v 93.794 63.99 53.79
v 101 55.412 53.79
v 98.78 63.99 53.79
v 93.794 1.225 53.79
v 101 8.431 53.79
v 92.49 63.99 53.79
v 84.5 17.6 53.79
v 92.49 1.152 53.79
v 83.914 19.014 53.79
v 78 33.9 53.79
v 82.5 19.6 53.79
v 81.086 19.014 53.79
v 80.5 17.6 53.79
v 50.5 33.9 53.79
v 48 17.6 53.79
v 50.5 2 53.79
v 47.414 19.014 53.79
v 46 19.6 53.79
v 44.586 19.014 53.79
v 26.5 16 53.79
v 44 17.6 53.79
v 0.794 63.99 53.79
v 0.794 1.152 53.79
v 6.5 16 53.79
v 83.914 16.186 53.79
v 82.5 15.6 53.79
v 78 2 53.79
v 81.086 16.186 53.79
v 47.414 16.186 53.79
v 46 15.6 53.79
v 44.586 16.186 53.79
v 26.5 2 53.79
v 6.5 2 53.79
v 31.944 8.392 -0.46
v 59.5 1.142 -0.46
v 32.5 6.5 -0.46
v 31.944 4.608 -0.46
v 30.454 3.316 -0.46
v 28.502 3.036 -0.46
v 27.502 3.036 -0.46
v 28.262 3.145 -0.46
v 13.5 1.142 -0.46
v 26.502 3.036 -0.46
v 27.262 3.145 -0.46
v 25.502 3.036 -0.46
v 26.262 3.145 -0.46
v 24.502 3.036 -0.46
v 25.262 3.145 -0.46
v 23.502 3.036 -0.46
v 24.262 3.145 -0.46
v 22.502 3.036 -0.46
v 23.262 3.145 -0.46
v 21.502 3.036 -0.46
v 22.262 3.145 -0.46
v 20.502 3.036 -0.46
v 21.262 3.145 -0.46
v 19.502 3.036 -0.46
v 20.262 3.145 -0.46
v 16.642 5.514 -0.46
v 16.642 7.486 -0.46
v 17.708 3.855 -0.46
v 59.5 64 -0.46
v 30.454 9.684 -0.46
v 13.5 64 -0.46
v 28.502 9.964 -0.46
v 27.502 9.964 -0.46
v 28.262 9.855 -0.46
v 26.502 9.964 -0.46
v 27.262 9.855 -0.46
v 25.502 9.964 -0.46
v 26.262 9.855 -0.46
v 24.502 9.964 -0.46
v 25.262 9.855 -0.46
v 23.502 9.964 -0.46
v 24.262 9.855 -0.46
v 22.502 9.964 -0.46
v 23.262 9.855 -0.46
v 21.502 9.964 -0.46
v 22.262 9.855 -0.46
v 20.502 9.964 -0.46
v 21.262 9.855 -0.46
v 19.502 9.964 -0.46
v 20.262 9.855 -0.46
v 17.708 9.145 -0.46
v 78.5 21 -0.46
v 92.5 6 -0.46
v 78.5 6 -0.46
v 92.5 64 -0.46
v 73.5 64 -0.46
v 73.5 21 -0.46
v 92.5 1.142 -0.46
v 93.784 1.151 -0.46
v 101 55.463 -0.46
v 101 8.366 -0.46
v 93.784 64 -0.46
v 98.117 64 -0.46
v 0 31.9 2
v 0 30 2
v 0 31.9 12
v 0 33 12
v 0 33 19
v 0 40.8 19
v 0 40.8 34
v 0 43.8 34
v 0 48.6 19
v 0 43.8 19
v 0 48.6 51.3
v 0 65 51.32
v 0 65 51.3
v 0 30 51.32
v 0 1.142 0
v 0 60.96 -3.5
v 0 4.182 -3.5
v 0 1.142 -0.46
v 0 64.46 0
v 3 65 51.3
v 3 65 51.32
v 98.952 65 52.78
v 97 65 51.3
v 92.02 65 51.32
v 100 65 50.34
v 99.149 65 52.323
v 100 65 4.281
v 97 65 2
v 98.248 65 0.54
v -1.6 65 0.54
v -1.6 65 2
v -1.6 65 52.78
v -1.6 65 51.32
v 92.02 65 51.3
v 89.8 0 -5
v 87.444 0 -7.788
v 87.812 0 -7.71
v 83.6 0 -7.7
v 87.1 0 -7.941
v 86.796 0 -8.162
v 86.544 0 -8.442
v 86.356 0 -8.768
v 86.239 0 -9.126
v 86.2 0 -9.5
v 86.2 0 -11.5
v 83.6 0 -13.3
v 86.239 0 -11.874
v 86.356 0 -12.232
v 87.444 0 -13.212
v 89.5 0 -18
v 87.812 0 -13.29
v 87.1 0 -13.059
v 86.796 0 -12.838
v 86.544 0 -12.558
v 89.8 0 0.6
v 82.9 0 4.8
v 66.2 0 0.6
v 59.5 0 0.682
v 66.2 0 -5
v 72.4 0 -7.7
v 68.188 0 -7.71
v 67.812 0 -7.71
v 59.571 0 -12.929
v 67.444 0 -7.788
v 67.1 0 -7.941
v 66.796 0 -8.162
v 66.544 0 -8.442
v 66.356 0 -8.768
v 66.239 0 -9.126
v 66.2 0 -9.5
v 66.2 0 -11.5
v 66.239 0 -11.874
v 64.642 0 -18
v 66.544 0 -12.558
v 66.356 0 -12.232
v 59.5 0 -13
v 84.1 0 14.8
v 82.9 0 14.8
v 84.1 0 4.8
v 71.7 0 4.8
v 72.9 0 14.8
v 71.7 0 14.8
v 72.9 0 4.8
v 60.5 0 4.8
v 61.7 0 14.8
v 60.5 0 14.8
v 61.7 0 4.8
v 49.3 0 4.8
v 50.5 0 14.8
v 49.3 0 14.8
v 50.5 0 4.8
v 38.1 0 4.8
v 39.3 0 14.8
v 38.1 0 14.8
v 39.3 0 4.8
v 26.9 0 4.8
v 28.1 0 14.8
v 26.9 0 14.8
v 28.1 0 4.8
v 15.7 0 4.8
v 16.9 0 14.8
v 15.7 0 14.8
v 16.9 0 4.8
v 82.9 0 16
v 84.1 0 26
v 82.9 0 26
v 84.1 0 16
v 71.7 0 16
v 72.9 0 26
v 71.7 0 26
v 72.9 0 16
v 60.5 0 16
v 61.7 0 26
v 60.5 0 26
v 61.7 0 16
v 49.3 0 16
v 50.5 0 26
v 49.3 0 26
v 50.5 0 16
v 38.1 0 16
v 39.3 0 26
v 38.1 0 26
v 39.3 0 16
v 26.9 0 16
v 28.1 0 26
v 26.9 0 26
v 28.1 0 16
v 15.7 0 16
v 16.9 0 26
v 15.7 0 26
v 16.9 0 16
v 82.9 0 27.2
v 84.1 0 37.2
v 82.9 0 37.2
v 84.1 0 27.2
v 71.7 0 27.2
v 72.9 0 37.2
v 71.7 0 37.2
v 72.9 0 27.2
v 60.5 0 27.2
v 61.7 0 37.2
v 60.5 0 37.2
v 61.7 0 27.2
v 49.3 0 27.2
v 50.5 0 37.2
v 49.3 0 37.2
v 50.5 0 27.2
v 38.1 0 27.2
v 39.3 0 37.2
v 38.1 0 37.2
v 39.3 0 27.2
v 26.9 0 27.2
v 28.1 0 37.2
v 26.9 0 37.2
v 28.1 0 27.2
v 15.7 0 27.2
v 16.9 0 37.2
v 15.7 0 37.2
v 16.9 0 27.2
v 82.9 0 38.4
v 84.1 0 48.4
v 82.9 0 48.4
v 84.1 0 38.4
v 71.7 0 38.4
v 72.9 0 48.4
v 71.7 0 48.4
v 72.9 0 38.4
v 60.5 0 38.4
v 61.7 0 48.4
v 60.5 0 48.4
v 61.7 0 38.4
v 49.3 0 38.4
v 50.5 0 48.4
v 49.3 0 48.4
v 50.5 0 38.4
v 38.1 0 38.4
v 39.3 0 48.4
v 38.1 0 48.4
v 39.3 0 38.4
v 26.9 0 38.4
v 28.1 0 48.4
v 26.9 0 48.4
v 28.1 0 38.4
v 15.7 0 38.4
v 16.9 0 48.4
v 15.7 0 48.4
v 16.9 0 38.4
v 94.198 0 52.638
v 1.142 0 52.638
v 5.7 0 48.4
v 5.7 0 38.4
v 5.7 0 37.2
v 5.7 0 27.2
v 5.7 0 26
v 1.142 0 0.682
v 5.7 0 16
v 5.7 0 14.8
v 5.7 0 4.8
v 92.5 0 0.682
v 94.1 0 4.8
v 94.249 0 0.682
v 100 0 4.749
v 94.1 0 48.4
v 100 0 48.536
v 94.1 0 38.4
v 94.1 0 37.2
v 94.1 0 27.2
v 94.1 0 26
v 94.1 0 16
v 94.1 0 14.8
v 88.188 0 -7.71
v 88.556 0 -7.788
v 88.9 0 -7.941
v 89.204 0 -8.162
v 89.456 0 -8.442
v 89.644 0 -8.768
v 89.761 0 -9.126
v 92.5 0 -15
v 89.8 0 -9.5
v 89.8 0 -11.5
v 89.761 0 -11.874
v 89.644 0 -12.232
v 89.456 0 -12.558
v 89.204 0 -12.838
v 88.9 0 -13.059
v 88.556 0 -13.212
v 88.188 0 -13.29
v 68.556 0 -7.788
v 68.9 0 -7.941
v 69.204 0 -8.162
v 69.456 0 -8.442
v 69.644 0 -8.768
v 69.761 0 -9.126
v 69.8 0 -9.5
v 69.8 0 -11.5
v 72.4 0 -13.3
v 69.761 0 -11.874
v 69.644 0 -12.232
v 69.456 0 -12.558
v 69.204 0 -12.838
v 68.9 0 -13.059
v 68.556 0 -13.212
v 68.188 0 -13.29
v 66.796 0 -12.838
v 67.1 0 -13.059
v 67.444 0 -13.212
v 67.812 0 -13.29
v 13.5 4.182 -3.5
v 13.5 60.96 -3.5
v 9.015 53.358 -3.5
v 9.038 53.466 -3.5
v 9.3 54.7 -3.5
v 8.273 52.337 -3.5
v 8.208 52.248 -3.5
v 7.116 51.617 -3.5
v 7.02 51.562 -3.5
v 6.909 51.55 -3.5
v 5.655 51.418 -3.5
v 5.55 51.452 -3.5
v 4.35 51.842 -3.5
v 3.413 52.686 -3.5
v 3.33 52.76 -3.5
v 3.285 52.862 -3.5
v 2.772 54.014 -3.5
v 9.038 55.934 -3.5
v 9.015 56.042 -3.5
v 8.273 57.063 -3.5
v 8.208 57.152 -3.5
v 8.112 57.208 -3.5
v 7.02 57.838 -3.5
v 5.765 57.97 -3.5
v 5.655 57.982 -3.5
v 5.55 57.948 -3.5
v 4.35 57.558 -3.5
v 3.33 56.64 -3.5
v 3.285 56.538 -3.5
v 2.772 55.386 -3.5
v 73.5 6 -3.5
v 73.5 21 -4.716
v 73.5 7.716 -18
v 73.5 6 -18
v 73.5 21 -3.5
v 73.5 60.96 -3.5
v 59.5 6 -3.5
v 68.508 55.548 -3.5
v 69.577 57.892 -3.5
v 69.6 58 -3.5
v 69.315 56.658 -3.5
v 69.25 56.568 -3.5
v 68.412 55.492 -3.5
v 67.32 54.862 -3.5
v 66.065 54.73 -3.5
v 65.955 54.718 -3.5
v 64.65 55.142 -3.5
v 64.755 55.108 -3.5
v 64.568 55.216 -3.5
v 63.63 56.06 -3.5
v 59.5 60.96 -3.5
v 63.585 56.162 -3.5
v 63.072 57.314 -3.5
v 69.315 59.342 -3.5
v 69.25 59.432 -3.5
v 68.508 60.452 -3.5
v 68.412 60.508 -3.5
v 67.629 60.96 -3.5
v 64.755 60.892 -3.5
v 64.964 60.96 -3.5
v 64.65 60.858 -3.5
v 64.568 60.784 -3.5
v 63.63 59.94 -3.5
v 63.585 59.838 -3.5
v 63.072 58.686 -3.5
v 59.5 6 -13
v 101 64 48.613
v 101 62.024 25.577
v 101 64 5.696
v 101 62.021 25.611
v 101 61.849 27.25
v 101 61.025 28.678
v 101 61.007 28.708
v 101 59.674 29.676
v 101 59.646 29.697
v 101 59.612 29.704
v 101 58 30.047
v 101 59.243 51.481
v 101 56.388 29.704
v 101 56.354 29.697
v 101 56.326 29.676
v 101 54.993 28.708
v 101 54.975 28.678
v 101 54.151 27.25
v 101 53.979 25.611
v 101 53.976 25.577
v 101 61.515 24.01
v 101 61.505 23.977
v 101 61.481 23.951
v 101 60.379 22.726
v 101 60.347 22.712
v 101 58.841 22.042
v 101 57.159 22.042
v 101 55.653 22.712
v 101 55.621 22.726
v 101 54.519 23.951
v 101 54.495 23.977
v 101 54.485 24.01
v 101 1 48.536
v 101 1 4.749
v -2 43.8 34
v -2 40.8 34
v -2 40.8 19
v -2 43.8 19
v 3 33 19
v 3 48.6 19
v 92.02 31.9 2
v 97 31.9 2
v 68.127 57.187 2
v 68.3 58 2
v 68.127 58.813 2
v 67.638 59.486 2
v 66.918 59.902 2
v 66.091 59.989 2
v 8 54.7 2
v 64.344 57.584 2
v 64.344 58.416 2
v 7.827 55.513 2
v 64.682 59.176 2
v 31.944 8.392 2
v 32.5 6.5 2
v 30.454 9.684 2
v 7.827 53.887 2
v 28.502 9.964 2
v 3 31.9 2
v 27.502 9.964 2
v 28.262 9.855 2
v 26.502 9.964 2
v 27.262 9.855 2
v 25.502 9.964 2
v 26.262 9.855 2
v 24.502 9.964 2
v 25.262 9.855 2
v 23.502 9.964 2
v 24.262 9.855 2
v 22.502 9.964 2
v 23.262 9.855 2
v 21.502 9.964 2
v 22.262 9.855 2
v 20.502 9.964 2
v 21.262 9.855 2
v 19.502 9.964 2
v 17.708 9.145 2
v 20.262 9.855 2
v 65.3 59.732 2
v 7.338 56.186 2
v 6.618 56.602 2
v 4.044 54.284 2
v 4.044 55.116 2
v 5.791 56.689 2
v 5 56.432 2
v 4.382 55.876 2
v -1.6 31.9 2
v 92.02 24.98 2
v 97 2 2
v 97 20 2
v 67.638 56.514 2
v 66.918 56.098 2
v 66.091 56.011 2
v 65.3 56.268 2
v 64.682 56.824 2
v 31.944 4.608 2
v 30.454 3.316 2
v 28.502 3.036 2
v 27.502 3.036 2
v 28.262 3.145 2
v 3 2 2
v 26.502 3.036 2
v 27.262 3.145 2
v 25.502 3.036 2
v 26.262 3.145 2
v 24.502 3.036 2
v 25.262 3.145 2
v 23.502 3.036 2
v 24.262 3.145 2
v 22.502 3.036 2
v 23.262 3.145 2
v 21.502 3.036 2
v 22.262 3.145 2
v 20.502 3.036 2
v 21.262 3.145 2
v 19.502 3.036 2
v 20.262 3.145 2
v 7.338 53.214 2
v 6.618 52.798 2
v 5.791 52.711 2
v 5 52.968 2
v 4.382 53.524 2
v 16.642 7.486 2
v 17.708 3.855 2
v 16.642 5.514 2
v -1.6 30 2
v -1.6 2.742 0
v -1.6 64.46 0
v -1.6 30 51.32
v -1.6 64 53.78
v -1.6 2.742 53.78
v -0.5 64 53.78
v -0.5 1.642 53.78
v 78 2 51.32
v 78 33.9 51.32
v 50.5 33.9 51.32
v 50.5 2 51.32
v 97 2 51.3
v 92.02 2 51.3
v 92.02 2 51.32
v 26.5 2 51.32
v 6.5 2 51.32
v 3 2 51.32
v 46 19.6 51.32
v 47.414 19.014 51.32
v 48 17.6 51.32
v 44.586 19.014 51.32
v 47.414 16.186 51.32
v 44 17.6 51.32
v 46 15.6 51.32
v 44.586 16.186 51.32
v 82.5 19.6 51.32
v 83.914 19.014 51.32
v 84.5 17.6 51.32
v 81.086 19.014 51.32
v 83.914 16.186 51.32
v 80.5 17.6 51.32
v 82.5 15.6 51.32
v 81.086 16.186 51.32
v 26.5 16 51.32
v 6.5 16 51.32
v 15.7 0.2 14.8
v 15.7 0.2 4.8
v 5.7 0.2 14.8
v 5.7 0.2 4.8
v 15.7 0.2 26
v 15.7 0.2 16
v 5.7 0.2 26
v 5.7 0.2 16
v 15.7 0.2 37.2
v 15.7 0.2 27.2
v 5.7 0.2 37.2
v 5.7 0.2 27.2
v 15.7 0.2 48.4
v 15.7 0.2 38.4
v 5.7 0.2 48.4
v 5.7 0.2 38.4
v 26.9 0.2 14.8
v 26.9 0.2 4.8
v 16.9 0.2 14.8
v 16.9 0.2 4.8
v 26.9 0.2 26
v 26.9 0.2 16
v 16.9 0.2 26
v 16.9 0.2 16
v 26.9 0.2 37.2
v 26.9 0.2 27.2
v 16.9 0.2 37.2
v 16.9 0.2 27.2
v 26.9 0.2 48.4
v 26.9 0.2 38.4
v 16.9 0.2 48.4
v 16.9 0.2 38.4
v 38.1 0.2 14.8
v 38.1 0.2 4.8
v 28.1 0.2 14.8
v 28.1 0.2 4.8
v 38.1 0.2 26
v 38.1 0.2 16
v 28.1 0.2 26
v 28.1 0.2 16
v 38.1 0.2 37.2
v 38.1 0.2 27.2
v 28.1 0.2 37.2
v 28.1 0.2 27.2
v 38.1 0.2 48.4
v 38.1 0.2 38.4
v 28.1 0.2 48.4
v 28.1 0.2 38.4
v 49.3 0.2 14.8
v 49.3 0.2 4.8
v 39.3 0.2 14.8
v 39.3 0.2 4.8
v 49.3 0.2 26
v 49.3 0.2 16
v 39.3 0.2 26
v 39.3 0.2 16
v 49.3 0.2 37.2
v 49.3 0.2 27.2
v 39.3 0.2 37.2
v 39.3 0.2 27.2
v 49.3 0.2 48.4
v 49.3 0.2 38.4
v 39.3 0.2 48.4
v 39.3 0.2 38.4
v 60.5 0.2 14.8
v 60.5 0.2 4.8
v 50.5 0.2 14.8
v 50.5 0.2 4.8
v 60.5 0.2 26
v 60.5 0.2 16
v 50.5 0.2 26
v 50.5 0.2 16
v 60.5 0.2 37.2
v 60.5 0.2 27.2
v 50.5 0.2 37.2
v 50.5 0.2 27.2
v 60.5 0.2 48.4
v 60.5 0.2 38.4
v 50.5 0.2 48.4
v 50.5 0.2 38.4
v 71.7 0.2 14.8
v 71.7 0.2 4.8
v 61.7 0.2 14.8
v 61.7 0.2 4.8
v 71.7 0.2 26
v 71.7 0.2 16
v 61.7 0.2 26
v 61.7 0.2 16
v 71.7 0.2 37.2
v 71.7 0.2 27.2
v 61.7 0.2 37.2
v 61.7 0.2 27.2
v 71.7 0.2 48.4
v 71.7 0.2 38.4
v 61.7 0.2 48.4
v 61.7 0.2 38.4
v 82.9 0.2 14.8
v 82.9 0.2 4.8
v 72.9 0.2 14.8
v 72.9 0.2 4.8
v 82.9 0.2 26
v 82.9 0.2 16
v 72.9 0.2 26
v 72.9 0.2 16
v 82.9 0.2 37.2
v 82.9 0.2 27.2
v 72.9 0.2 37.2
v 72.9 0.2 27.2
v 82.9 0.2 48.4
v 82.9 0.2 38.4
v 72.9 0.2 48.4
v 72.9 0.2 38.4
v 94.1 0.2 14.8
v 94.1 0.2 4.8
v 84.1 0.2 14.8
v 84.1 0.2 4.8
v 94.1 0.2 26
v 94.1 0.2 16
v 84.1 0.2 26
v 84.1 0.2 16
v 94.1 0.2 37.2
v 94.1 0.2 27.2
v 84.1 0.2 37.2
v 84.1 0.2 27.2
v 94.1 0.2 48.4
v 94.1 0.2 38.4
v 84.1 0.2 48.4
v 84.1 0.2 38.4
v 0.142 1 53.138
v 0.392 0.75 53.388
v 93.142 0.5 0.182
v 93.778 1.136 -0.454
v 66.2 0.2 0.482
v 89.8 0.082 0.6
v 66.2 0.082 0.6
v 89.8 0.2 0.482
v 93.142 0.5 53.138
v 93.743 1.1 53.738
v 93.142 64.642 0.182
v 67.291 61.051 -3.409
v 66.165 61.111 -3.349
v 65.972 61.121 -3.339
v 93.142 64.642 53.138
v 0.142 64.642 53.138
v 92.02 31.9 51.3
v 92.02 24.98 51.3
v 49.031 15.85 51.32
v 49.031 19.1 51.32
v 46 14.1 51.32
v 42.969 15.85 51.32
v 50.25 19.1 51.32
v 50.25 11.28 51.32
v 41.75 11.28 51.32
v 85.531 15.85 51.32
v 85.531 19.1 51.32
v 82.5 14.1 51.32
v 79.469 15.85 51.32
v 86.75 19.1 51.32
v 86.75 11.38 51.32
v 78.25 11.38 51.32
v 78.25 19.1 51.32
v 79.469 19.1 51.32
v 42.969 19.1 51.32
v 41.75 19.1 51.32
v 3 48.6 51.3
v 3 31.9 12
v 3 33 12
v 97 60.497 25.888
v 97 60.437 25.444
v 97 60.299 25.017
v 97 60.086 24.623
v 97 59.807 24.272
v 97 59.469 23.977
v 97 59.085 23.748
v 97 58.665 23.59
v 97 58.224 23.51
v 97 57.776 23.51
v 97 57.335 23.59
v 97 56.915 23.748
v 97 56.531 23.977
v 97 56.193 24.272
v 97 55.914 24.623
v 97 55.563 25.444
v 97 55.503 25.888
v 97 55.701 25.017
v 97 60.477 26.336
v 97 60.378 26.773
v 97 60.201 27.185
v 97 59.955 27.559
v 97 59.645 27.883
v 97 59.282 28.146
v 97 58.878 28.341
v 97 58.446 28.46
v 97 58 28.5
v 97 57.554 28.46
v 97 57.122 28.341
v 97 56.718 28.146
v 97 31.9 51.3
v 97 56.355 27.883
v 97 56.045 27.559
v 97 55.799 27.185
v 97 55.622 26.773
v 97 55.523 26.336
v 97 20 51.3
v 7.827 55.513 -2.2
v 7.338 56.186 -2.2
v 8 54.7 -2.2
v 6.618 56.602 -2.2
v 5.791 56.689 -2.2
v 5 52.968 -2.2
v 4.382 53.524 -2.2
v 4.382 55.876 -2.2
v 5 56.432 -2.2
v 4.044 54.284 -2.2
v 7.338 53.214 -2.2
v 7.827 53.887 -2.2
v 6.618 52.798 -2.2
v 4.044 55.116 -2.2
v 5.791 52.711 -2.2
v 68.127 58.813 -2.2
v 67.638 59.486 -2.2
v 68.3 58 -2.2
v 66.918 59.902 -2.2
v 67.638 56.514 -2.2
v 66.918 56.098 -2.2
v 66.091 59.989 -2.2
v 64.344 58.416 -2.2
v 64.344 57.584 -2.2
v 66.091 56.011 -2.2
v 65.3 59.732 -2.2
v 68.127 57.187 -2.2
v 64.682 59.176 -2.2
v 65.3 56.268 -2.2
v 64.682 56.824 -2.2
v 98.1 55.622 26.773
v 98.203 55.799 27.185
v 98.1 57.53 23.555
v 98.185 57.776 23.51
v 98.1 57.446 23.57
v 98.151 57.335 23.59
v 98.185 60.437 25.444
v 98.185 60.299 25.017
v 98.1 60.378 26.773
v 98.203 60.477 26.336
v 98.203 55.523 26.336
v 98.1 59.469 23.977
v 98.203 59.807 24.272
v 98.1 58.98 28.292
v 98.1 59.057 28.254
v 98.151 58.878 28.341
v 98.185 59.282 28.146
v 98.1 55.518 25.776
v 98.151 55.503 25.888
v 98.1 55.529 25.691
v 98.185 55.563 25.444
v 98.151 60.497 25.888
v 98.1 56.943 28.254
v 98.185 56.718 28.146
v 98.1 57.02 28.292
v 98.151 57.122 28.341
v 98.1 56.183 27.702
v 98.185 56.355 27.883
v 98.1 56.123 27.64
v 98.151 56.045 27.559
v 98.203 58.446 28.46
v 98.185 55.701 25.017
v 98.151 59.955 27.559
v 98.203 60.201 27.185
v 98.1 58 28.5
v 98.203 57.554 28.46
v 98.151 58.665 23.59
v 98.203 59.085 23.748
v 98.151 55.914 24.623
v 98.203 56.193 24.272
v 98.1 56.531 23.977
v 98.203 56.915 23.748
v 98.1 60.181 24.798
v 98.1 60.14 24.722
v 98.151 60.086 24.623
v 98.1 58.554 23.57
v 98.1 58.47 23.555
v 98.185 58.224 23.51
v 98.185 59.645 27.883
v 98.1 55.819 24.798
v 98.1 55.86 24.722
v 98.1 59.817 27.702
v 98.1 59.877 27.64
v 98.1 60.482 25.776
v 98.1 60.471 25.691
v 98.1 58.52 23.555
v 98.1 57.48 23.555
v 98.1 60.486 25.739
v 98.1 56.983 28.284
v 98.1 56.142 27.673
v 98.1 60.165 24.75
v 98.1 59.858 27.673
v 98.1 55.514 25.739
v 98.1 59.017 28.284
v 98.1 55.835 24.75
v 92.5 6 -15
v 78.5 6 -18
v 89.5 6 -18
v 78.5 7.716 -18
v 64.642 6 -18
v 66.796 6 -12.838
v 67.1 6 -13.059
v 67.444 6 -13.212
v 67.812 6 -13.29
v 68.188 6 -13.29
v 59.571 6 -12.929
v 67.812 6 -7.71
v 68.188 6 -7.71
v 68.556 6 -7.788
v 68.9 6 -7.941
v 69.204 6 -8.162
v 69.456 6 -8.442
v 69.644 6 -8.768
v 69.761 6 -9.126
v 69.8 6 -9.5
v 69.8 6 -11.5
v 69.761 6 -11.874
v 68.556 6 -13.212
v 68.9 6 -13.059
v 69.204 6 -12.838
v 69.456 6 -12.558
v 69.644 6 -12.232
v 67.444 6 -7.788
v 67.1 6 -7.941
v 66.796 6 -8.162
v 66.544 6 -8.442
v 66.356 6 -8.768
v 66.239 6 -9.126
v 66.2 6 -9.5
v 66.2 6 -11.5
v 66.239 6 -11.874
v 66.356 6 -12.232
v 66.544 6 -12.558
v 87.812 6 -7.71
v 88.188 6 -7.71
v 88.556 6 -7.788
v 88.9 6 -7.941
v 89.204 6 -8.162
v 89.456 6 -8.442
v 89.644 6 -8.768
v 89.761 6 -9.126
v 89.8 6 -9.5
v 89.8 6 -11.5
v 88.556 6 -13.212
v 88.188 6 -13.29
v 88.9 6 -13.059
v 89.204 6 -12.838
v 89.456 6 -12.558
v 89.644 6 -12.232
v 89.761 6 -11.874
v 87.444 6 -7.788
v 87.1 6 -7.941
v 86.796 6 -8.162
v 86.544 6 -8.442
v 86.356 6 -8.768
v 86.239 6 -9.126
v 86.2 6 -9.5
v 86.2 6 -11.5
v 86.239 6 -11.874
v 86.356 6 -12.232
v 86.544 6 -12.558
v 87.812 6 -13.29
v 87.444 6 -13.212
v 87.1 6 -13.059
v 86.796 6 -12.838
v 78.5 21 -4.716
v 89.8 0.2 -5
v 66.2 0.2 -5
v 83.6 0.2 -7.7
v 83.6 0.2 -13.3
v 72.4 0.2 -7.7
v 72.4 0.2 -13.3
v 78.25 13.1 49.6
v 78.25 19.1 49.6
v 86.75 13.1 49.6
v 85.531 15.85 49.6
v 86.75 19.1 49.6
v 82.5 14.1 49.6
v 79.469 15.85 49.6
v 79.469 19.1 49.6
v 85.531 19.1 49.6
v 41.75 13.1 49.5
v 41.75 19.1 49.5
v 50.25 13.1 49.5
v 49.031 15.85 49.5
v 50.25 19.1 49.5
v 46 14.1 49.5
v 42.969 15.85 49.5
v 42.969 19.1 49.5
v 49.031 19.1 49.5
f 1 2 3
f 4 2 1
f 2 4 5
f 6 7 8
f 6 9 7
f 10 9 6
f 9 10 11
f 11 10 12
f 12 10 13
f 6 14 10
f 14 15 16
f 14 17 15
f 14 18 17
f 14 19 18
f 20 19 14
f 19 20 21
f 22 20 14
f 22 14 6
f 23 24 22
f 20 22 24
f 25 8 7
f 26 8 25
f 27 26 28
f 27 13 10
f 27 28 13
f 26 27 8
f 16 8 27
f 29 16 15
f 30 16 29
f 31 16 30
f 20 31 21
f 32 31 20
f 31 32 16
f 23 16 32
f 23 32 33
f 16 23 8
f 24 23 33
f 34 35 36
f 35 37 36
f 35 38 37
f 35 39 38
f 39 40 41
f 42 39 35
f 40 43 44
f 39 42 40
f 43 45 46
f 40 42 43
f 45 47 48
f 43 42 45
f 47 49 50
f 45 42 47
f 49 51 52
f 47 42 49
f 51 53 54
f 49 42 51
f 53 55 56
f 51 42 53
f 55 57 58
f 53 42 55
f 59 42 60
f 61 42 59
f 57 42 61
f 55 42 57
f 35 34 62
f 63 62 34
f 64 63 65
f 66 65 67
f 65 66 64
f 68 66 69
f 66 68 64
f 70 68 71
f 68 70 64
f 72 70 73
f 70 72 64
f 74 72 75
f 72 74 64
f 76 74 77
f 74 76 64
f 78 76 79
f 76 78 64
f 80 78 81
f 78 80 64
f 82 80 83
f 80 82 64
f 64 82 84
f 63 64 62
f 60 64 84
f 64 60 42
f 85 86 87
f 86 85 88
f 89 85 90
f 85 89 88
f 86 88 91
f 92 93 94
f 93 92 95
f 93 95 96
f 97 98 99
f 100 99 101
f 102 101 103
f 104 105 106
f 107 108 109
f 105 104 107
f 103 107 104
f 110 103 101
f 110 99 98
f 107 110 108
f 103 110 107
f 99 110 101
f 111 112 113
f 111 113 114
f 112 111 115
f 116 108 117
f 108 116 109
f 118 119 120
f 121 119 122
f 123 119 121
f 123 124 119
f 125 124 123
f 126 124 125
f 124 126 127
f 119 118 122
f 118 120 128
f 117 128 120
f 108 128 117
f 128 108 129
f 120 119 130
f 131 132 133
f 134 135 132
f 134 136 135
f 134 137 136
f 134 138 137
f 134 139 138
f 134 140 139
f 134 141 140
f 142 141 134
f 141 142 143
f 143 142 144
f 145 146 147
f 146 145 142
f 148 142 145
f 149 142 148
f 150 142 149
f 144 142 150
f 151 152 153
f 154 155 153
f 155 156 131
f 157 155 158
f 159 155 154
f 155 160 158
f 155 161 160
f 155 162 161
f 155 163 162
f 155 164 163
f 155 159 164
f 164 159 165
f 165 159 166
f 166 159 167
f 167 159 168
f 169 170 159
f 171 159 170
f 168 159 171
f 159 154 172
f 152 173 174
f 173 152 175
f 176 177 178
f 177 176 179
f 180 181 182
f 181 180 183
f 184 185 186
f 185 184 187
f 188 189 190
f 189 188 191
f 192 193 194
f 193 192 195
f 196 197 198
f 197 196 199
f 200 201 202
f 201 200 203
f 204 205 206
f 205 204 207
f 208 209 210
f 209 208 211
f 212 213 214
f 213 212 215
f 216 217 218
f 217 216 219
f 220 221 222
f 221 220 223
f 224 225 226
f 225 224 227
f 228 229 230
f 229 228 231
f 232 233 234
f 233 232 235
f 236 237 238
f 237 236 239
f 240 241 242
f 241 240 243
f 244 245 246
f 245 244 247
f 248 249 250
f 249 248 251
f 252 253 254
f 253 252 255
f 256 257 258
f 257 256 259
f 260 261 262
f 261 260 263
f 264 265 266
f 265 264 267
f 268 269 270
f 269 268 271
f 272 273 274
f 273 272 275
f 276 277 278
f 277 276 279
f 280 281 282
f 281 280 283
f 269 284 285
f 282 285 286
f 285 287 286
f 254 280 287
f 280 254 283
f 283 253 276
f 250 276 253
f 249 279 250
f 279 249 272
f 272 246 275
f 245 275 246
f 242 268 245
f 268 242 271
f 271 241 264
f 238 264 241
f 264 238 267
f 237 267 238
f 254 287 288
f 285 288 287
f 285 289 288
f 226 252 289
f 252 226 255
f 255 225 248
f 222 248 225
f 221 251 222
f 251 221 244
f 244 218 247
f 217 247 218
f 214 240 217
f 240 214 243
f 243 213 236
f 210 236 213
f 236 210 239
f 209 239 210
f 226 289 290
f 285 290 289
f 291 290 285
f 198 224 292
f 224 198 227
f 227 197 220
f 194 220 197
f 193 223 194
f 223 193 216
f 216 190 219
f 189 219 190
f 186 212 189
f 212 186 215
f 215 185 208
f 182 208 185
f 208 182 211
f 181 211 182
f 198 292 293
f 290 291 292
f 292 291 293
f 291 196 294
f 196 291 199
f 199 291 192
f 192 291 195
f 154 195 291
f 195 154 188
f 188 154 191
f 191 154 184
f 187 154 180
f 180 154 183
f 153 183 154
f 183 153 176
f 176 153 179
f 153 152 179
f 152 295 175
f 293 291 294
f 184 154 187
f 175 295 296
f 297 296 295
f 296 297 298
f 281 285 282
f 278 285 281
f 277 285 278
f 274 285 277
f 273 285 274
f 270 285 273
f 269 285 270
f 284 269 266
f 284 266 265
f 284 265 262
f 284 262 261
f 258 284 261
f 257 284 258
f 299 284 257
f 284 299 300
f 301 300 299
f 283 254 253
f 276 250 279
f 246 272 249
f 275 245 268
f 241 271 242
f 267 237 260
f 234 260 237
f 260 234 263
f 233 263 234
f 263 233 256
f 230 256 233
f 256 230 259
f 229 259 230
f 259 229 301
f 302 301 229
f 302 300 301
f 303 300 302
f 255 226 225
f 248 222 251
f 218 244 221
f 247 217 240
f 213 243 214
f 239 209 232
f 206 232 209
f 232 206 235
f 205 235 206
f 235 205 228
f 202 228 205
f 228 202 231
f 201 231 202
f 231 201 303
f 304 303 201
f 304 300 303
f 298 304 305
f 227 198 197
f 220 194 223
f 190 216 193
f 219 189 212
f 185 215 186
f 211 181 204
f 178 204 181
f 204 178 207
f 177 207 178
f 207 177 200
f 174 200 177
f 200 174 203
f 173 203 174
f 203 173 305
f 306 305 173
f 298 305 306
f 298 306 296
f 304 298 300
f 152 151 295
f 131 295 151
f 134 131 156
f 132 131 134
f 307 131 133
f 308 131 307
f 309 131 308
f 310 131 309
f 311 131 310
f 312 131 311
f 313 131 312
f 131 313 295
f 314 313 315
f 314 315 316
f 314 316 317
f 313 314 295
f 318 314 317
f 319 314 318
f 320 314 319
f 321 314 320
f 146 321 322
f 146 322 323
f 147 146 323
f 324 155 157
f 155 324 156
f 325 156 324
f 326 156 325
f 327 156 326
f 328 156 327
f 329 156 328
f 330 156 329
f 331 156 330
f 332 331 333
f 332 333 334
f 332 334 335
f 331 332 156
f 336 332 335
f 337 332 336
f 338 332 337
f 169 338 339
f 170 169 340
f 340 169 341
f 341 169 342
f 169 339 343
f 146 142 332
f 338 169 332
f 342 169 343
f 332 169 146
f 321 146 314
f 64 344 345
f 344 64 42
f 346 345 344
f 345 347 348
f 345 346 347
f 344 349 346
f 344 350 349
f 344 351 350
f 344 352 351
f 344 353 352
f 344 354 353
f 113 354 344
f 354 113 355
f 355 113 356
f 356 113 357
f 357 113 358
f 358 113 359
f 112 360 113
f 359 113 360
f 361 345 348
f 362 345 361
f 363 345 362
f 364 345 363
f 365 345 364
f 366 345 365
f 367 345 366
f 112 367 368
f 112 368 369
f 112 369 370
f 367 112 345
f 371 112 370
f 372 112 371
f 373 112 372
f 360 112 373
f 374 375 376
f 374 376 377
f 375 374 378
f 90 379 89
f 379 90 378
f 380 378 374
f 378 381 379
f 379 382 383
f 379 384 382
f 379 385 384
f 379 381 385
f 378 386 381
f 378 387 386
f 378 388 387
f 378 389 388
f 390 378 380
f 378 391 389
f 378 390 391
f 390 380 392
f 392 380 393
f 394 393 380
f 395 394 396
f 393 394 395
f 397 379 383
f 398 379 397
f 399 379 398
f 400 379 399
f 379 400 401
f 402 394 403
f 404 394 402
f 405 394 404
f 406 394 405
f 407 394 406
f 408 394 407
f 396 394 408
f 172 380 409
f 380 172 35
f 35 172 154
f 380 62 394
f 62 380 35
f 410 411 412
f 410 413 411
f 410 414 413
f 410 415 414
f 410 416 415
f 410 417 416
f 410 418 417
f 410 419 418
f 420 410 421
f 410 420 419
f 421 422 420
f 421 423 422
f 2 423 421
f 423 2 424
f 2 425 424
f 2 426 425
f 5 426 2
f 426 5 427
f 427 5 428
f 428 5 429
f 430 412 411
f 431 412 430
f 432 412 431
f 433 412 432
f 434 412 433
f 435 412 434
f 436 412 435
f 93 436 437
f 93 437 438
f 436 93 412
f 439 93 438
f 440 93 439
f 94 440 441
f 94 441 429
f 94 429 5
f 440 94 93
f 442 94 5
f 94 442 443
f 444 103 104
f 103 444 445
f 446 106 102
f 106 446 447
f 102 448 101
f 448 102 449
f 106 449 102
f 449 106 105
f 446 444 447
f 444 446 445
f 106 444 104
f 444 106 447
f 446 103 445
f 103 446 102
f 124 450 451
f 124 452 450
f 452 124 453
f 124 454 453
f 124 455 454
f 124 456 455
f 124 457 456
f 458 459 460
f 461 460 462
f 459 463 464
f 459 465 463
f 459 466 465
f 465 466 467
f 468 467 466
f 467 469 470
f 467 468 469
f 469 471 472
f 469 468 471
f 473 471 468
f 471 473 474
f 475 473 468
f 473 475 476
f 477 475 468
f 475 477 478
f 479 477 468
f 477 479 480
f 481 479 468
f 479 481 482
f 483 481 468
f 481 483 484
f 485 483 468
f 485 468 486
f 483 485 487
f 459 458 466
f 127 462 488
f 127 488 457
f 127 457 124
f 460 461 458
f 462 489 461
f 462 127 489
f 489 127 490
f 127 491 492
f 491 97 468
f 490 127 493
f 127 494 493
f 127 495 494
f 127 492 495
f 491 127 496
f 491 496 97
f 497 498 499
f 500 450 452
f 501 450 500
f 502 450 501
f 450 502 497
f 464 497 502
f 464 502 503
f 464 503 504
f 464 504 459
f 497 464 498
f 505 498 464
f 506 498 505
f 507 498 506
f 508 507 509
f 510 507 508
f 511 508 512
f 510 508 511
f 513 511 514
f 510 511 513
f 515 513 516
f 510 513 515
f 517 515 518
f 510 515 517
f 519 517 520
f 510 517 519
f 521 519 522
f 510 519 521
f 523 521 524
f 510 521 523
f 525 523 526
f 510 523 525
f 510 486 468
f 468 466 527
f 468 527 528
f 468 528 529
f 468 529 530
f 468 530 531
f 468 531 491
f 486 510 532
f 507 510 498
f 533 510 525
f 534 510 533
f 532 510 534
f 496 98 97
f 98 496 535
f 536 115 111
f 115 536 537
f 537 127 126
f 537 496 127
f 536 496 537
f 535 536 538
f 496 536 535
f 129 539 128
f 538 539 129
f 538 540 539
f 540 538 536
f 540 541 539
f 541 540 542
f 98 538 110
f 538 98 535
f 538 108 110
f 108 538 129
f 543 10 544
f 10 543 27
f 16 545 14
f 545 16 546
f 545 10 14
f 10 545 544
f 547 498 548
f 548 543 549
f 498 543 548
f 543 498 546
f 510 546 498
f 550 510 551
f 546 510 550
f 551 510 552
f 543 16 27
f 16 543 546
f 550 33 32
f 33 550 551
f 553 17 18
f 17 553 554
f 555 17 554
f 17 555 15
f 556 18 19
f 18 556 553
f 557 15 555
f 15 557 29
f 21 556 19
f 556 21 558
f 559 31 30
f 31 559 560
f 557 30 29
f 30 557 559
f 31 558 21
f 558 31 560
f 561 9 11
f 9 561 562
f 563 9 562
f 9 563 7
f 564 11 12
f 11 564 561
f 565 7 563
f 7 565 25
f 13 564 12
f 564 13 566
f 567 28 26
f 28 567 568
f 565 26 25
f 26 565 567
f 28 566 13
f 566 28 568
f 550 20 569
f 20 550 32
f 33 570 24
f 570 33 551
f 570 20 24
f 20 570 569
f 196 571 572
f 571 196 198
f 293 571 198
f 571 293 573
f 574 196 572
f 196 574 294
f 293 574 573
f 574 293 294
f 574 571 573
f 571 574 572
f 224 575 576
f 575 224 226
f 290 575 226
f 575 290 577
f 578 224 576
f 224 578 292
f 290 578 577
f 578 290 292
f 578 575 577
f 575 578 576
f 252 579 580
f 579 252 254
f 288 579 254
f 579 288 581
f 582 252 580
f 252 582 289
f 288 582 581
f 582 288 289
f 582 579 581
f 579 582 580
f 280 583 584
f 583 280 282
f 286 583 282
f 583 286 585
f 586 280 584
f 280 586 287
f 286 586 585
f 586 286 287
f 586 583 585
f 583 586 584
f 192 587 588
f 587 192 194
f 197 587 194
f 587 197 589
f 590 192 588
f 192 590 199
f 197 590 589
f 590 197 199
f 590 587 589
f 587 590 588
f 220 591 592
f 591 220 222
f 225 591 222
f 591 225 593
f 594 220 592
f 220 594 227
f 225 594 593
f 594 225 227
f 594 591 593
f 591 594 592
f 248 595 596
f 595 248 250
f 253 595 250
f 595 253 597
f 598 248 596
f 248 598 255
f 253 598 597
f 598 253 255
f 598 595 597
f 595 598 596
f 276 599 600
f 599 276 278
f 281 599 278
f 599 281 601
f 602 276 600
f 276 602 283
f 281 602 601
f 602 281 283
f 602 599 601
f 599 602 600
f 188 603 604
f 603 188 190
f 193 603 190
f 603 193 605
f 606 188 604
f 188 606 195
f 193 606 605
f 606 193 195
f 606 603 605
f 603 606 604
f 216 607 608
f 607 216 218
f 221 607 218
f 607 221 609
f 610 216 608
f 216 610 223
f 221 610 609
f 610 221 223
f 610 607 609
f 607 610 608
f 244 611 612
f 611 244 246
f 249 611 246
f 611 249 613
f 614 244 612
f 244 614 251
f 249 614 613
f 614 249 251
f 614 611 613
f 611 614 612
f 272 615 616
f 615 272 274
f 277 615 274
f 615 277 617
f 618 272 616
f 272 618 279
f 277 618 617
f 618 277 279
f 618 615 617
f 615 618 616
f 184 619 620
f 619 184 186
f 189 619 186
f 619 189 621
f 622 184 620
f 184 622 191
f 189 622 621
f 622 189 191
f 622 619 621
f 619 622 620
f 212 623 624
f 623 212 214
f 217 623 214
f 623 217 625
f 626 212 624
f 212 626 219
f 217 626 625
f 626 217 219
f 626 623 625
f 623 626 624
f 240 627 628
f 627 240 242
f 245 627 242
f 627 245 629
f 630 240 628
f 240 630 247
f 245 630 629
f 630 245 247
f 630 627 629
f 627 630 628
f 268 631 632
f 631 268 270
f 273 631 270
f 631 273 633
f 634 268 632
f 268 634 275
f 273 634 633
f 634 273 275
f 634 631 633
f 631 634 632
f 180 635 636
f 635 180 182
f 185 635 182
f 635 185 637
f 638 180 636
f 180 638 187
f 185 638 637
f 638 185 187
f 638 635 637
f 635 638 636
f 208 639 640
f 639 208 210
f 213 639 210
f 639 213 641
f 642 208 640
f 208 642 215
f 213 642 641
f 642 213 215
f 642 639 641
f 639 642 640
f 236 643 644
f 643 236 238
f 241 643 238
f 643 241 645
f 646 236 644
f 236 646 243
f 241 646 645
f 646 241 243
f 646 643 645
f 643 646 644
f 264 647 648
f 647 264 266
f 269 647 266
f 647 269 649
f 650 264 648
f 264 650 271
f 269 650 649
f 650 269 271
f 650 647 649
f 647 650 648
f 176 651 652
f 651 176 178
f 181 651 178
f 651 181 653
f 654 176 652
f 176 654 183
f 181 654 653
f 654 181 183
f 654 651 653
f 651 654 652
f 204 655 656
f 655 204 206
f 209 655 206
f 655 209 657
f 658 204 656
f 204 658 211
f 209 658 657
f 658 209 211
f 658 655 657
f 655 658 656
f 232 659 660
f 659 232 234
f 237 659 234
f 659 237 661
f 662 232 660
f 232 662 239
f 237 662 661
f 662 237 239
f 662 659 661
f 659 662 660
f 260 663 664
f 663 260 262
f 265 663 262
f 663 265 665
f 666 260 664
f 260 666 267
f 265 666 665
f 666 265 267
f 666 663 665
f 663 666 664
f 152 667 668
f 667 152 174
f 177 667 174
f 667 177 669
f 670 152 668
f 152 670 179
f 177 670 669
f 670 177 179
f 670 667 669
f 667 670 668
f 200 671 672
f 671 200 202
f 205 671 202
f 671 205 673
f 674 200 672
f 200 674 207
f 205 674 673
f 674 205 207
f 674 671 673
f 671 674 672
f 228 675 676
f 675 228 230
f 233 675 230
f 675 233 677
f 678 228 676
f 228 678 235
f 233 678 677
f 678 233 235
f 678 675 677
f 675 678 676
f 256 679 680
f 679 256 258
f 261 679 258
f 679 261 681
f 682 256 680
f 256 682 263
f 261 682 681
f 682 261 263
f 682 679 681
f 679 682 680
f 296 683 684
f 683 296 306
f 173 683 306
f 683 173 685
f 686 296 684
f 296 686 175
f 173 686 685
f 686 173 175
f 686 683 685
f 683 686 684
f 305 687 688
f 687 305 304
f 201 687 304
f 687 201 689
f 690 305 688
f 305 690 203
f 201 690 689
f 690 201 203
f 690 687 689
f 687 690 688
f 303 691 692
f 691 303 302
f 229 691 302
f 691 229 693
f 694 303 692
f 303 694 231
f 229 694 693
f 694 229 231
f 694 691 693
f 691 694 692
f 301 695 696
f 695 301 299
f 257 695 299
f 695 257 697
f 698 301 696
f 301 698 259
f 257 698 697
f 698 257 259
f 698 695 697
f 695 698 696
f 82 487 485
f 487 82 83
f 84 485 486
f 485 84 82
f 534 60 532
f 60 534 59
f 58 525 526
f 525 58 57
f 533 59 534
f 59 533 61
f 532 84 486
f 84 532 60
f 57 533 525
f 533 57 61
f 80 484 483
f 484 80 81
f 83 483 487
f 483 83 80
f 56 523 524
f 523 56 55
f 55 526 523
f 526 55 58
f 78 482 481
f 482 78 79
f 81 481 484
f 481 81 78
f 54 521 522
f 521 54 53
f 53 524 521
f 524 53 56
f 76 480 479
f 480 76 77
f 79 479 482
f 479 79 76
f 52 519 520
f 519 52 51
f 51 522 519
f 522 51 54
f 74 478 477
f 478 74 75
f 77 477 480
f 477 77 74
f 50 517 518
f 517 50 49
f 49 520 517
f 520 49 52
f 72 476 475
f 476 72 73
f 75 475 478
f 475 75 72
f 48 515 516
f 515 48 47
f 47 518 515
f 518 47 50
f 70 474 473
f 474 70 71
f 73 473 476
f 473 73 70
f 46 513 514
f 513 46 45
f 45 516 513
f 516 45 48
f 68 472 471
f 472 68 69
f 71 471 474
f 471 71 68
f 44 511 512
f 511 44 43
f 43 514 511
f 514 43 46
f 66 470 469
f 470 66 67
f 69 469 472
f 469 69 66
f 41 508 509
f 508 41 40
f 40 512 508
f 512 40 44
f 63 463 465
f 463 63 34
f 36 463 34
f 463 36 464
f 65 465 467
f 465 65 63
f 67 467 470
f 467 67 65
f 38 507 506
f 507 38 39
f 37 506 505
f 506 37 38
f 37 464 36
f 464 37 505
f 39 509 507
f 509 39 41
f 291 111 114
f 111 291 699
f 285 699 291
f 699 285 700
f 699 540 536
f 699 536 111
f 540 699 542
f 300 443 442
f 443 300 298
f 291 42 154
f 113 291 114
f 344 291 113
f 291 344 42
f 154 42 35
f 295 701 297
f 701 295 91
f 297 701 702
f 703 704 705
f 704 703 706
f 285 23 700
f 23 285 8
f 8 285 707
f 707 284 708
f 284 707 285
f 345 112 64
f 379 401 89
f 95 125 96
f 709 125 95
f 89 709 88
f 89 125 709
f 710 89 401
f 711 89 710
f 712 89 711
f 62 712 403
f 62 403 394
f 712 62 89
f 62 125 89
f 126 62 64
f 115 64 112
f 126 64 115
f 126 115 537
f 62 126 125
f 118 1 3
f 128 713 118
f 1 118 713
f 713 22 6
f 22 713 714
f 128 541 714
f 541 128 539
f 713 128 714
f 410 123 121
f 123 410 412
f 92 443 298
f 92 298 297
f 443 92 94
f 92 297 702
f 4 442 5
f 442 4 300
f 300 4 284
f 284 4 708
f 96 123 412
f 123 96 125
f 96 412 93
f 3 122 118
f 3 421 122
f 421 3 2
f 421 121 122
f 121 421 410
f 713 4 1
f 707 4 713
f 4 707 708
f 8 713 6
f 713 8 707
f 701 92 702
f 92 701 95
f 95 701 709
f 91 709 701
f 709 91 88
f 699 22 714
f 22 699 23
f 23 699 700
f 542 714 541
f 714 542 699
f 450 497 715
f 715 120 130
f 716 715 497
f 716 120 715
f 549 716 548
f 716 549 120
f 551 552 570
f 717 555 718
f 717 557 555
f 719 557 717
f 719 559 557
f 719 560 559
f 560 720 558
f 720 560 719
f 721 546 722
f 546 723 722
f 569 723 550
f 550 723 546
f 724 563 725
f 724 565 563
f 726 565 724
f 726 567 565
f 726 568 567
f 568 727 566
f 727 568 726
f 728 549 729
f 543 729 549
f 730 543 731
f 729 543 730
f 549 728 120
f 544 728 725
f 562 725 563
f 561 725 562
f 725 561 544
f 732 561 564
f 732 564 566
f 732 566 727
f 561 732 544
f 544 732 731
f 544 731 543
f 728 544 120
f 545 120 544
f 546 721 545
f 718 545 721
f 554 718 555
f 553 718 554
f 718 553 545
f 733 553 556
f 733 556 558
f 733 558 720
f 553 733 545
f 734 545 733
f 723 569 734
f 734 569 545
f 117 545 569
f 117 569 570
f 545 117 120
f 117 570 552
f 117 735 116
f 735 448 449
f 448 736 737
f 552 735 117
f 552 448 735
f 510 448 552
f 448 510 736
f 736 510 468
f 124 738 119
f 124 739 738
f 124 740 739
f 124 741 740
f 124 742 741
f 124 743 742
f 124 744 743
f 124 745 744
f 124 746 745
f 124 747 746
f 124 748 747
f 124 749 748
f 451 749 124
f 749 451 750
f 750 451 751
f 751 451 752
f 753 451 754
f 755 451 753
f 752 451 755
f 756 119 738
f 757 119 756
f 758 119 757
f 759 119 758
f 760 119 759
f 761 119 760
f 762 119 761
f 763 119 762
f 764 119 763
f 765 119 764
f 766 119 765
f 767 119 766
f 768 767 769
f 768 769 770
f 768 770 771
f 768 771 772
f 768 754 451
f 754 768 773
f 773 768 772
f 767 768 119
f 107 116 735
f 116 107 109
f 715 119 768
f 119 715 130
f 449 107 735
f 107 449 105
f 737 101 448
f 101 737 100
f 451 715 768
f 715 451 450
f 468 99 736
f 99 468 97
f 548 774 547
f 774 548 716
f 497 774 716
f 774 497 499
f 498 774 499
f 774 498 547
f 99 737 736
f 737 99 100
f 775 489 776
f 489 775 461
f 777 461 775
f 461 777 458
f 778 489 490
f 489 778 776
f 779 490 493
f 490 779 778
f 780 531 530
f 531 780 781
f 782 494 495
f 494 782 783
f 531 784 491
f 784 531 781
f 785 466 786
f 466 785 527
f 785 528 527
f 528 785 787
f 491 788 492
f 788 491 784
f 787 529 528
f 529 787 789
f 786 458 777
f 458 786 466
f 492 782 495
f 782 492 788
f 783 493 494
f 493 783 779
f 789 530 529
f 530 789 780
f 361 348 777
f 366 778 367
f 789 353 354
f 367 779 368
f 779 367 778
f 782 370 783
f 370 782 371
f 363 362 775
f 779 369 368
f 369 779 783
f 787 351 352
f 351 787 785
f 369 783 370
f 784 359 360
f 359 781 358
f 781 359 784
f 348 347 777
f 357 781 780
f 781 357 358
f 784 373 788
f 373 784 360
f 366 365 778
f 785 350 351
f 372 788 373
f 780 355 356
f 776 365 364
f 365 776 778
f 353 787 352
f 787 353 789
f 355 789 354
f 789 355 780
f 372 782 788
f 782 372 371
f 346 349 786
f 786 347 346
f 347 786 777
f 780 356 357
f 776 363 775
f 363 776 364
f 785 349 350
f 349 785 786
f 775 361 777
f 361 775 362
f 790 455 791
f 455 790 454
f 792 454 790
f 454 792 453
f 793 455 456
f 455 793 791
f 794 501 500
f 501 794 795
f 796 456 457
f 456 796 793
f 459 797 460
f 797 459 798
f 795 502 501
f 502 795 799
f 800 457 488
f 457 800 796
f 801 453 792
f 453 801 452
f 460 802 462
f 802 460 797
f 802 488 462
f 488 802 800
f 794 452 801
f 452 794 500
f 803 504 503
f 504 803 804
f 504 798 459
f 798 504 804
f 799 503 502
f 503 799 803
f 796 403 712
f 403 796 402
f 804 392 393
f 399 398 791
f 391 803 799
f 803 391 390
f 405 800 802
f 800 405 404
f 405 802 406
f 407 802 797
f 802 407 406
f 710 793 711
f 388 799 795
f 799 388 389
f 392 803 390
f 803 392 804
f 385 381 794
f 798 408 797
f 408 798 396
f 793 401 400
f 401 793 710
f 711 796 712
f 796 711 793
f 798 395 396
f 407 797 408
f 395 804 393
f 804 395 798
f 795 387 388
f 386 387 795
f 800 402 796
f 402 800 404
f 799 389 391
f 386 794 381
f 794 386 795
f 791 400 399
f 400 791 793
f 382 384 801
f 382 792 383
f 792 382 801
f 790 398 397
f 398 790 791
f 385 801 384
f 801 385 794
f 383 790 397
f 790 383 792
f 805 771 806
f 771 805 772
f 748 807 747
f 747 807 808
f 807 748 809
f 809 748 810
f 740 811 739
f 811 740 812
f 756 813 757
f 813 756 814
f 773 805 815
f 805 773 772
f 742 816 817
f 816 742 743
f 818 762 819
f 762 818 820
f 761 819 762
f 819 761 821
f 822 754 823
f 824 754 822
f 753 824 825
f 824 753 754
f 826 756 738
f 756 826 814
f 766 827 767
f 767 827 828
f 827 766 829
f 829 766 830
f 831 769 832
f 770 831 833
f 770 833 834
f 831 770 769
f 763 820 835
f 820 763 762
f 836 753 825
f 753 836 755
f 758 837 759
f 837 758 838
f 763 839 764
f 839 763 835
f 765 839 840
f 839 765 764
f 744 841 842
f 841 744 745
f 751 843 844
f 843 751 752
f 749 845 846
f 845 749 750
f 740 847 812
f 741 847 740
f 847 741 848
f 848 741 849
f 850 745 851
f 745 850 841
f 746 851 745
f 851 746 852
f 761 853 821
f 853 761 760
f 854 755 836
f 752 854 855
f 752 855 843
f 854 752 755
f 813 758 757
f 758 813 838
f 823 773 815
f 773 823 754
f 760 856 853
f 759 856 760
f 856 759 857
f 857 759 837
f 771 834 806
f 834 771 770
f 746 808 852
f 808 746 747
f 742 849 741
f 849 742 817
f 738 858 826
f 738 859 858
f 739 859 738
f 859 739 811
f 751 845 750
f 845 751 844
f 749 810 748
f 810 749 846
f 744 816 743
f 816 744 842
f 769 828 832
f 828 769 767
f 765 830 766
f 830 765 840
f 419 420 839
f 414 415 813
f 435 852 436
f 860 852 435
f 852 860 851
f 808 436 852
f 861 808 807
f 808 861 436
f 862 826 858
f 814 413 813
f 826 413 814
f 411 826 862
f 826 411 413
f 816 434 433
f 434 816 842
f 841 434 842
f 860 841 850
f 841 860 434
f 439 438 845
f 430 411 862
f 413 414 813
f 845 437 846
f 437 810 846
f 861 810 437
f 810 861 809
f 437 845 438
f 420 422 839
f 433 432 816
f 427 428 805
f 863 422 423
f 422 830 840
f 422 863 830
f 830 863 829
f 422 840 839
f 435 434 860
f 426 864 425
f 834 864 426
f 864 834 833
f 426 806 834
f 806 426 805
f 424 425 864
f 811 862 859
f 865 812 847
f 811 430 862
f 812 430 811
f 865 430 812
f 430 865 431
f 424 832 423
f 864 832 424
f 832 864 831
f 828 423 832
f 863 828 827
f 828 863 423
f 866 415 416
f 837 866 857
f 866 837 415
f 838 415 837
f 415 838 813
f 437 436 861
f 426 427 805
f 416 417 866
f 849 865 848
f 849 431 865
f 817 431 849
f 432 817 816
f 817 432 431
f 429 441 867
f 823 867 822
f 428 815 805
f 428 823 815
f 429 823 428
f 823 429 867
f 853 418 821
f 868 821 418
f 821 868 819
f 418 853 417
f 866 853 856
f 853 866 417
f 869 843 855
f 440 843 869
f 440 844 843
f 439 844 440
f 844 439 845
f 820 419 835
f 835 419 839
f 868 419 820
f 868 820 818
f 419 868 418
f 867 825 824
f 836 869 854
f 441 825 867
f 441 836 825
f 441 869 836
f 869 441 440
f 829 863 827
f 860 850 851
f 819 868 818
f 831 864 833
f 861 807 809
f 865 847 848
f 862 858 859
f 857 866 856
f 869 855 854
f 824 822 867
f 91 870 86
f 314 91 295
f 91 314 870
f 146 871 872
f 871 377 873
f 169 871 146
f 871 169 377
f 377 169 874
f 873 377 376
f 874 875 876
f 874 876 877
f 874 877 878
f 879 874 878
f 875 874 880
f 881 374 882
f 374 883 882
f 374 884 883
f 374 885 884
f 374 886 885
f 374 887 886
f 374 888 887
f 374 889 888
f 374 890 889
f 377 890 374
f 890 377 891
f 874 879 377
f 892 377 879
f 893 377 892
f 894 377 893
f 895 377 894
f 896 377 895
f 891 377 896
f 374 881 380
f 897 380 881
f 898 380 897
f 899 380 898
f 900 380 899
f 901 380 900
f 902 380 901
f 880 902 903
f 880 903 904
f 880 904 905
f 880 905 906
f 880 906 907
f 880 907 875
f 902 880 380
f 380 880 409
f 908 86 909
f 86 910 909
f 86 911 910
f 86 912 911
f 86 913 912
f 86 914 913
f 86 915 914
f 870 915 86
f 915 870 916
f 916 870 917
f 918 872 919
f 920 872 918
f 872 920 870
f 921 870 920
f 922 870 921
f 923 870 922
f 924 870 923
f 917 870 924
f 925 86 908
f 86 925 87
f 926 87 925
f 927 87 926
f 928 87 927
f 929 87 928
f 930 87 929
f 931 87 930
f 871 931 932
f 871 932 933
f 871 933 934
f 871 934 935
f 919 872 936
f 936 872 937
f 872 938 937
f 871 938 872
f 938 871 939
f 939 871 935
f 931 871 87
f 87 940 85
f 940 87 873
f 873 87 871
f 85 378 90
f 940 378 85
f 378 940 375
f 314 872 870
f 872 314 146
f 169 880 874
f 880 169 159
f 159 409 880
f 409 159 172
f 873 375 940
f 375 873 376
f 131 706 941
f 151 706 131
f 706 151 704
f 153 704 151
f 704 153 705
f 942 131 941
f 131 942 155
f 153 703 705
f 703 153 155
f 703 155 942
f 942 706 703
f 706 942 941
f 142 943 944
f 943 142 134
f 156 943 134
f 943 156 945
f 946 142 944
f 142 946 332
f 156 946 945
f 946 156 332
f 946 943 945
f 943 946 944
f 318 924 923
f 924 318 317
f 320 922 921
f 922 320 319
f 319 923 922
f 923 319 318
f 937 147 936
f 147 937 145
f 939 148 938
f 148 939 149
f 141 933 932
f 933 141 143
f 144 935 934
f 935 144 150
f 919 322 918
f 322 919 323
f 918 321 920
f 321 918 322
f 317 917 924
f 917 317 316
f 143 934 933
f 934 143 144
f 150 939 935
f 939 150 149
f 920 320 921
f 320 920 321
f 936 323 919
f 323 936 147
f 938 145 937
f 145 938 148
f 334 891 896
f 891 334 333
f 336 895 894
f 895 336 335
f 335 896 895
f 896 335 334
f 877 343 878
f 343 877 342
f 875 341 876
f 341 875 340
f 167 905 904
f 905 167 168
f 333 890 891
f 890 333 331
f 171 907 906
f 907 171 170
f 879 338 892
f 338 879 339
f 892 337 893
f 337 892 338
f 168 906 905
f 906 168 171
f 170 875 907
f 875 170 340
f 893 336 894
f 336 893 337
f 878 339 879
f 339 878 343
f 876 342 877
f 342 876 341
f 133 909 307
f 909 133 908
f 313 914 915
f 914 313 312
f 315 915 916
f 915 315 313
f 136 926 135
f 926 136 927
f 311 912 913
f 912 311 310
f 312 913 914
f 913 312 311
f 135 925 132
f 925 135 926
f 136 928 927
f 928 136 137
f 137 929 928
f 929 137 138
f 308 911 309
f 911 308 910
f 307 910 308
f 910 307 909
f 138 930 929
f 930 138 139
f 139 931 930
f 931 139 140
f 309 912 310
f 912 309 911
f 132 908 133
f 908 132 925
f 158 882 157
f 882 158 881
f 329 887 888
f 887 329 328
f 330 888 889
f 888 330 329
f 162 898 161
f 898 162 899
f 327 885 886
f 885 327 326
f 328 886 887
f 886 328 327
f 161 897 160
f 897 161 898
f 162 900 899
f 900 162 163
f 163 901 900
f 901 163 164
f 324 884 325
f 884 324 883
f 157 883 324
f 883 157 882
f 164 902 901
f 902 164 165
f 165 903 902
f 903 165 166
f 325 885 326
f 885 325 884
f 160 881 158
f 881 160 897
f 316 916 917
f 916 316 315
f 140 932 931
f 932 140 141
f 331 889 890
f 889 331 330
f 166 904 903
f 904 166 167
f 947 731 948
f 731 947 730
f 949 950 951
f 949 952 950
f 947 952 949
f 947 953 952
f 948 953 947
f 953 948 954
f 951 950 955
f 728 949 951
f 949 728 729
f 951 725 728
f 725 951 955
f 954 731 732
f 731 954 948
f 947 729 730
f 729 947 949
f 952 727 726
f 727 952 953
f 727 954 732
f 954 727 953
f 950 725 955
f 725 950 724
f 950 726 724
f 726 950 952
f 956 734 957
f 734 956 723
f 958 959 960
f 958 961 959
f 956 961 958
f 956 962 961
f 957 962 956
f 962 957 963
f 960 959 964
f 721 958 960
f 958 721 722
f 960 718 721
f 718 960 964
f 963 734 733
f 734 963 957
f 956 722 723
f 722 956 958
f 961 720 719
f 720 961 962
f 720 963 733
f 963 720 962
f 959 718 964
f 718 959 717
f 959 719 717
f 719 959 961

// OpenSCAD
// PRUSA iteration3
// PSU Cover
// GNU GPL v3
// Josef Průša <iam@josefprusa.cz> and contributors
// http://www.reprap.org/wiki/Prusa_Mendel
// http://prusamendel.org

module CubeAdjust(Xdim, Zdim){
    for (x =[6:11.2:Xdim-12]){
        for (z =[6:11.2:Zdim-12]){
            translate([x,-0.2,z]) cube([10,0.4,10]);
        }
    }
}

module nuttrap(){
    rotate([0, 180, 0]) difference(){
        union(){
            translate([-4.25,-7.5,0]) difference(){
            translate([0,0,0]) cube([8.5, 9, 3]);
            rotate([45,0,0]) cube([11.5,5.7,5.7]);
        }
    }
    translate([0,0, -0.2]) rotate([0,0,30]) cylinder(r=3.5,h=15-1.5,$fn=6);
  }
}

module psu_cover(){
    difference(){
        union(){
            translate([0,0,-0.46]) cube([95,50+15,54.25]); // Base

            translate([0,0,-3.5]) cube([14-0.5,50+15,5]); // Back pillar 1

            translate([60-0.5,0,-3.5]) cube([14,50+15,5]); // Back pillar 2

            translate([91+4,0,-0.46]) cube([6,50+15,54.25]); // Base for bracket

            translate([-2,45.4-4.6,19]) cube([2,3,15]); // Nipple on the right

            translate([-1.6,0,0]) cube([1.65,65,2]); // Frame skirt 1

            translate([-1.6,0,0]) cube([1.65,30,53.78]); // Frame skirt 2

            translate([-1.6,0,51.32]) cube([1.65,65,2.46]); // Frame skirt 3
        }

        // Pretty corners
        translate([-11,-2,-2]) rotate([0,0,-45] )cube([10,10,58]);
        translate([95-3+5+1,-2,-2]) rotate([0,0,-45]) cube([10,10,58]);

        translate([-3,-9,-4.46]) rotate([-45,0,0]) cube([130,10,10]);
        translate([-3,-12,54.78]) rotate([-45,0,0]) cube([130,10,10]);

        translate([-3,45+15,-4.46]) rotate([-45,0,0]) cube([130,10,10]);
        translate([-3,48+15,54.78]) rotate([-45,0,0]) cube([130,10,10]);

        translate([95-3+3,70,-2]) rotate([0,0,-45]) cube([10,10,58]);

        translate([95,0-10,-20]) rotate([0,-45,-45]) cube([20,20,20]);
        translate([95,0-10,45]) rotate([0,-45,-45]) cube([20,20,20]);

        translate([95,60,-10]) rotate([-35,-45,-45]) cube([20,20,20]);
        translate([95,60,65]) rotate([-55,48,-48]) cube([20,20,20]);

        translate([79,-5,67.28]) rotate([0,45,0]) cube([20,90,20]);

        translate([79,-5,-13.96])rotate([0,45,0]) cube([20,90,20]);

        translate([-14,-5,67.28]) rotate([0,45,0]) cube([20,90,20]);

        translate([3,2,2]) cube([89.02,50.02+15,50.02-0.7]); // Main cutout

        translate([-3,50-16.4+15,2]) cube([100,16.5,50-0.7]); // Insert cutout

        translate([-3,50-16.4-15.6+15,2]) cube([10,100,17]); // Right bottom cutout

        translate([85+2,50-16.4-17.6+15+0.9,2]) cube([10,100,50-0.7]); // Left bottom cutout

        translate([85+2,10,2]) rotate([0,0,45]) cube([10*sqrt(2),10*sqrt(2),50-0.7]);
        translate([85+2,2,2]) cube([10,18,50-0.7]);

        translate([-3,50-16.4-17.6+15+0.9,2]) cube([100,100,10]); // Bottom cutout

        translate([5.5,0,0]){
            translate([45,2,40]) cube([27.5,31.9,30]); // Socket cutout
            translate([45-4.5,2+15.6,40]) cylinder(r=2,h=50,$fn=8); // Socket right hole cutout
            translate([45-4.5+37-0.5,2+15.6,40]) cylinder(r=2,h=50,$fn=8); // Socket left hole cutout

            translate([1,2,44]) cube([20,14,30]); // Switch cutout
            translate([45-4.5+37-0.5,2+15.6,39.1]) rotate([0,0,30]) cylinder(r=3.25,h=15-2.8,$fn=6); // Socket left hole cutout nuttrap
            translate([45-4.5,2+15.6,39.1]) rotate([0,0,30]) cylinder(r=3.25,h=15-2.8, $fn=6); // Socket left hole cutout nuttrap
        }
        translate([7-0.5-0.5,40-1+15+0.7,-10]) cylinder(r=2,h=50,$fn=15); // Left back mounthole cutout
        translate([7-0.5-0.5,40-1+15+0.7,-3.7]) cylinder(r2=2,r1=3.5,h=1.5,$fn=15);

        translate([67.5-0.7-0.5,43.5-1+15+0.5,-10]) cylinder(r=2,h=50,$fn=15); // Right back mounthole cutout
        translate([67.5-0.7-0.5,43.5-1+15+0.5,-3.7]) cylinder(r2=2,r1=3.5,h=1.5,$fn=15);

        translate([130,32+26,55-4-25])rotate([0,-90,0]) cylinder(r=2.5,h=50,$fn=35); // Left side bracket screw hole
        translate([101.1,32+26,55-4-25])rotate([0,-90,0]) cylinder(r2=2.5,r1=4.1,h=3,$fn=15);

        translate([-0.3,0,-1.2])CubeAdjust(102,54.25);

        for(i=[0:9]){
            translate([20+i,6.5,-10])cylinder(r=3.5,h=50); // Left back mounthole cutout
        }
    }
}

module psu_y_reinforcement(){
    difference(){
        union(){
        // Base shape
            translate([59.5,0,-18]) cube([33,6,19]); // Reinforcement plate
            translate([73.5,5,-18]) cube([5,16,19]); // Vertical_reinforcement
        }
        union(){
            // Cutouts
            // Corner cuts
            translate([87.5,-8,-20 ]) rotate([0,45,0]) cube([10,20,10]); // Corner cut
            translate([52.5,-8,-20 ]) rotate([0,45,0]) cube([10,20,10]); // Corner cut

            // Angled vertical support
            translate([68.5,20,-34]) rotate([45,0,0]) cube([15,23,20]); // Vertical reinf cutout

            // Bottom surface cuts
            translate([66.2,-0.2,-5])cube([23.6,0.4,5.6]);
            translate([68+1.8+2.6,-0.2,-7.7-5.6])cube([11.2,0.4,5.6]);
            translate([88,8,-11.5]) rotate([90,0,0]) cylinder(h=10,r=1.8,$fn=30 ); // Hole A
            translate([68,8,-11.5]) rotate([90,0,0 ]) cylinder(h=10,r=1.8,$fn=30 ); // Hole B
            translate([88,8,-9.5]) rotate([90,0,0]) cylinder(h=10,r=1.8,$fn=30 ); // Hole A
            translate([68,8,-9.5]) rotate([90,0,0 ]) cylinder(h=10,r=1.8,$fn=30 ); // Hole B
            translate([86.2,-10,-11.5]) cube([3.6,20,2]); // Hole cut extension
            translate([66.2,-10,-11.5]) cube([3.6,20,2]); // Hole cut extension
        }
    }
}


module final_part(){
    union(){
        psu_cover();
        psu_y_reinforcement();
        translate([82.5,2+15.6,39.1+13.5]) nuttrap();
        translate([46,2+15.6,39+13.5]) nuttrap();
    }
}

final_part();
